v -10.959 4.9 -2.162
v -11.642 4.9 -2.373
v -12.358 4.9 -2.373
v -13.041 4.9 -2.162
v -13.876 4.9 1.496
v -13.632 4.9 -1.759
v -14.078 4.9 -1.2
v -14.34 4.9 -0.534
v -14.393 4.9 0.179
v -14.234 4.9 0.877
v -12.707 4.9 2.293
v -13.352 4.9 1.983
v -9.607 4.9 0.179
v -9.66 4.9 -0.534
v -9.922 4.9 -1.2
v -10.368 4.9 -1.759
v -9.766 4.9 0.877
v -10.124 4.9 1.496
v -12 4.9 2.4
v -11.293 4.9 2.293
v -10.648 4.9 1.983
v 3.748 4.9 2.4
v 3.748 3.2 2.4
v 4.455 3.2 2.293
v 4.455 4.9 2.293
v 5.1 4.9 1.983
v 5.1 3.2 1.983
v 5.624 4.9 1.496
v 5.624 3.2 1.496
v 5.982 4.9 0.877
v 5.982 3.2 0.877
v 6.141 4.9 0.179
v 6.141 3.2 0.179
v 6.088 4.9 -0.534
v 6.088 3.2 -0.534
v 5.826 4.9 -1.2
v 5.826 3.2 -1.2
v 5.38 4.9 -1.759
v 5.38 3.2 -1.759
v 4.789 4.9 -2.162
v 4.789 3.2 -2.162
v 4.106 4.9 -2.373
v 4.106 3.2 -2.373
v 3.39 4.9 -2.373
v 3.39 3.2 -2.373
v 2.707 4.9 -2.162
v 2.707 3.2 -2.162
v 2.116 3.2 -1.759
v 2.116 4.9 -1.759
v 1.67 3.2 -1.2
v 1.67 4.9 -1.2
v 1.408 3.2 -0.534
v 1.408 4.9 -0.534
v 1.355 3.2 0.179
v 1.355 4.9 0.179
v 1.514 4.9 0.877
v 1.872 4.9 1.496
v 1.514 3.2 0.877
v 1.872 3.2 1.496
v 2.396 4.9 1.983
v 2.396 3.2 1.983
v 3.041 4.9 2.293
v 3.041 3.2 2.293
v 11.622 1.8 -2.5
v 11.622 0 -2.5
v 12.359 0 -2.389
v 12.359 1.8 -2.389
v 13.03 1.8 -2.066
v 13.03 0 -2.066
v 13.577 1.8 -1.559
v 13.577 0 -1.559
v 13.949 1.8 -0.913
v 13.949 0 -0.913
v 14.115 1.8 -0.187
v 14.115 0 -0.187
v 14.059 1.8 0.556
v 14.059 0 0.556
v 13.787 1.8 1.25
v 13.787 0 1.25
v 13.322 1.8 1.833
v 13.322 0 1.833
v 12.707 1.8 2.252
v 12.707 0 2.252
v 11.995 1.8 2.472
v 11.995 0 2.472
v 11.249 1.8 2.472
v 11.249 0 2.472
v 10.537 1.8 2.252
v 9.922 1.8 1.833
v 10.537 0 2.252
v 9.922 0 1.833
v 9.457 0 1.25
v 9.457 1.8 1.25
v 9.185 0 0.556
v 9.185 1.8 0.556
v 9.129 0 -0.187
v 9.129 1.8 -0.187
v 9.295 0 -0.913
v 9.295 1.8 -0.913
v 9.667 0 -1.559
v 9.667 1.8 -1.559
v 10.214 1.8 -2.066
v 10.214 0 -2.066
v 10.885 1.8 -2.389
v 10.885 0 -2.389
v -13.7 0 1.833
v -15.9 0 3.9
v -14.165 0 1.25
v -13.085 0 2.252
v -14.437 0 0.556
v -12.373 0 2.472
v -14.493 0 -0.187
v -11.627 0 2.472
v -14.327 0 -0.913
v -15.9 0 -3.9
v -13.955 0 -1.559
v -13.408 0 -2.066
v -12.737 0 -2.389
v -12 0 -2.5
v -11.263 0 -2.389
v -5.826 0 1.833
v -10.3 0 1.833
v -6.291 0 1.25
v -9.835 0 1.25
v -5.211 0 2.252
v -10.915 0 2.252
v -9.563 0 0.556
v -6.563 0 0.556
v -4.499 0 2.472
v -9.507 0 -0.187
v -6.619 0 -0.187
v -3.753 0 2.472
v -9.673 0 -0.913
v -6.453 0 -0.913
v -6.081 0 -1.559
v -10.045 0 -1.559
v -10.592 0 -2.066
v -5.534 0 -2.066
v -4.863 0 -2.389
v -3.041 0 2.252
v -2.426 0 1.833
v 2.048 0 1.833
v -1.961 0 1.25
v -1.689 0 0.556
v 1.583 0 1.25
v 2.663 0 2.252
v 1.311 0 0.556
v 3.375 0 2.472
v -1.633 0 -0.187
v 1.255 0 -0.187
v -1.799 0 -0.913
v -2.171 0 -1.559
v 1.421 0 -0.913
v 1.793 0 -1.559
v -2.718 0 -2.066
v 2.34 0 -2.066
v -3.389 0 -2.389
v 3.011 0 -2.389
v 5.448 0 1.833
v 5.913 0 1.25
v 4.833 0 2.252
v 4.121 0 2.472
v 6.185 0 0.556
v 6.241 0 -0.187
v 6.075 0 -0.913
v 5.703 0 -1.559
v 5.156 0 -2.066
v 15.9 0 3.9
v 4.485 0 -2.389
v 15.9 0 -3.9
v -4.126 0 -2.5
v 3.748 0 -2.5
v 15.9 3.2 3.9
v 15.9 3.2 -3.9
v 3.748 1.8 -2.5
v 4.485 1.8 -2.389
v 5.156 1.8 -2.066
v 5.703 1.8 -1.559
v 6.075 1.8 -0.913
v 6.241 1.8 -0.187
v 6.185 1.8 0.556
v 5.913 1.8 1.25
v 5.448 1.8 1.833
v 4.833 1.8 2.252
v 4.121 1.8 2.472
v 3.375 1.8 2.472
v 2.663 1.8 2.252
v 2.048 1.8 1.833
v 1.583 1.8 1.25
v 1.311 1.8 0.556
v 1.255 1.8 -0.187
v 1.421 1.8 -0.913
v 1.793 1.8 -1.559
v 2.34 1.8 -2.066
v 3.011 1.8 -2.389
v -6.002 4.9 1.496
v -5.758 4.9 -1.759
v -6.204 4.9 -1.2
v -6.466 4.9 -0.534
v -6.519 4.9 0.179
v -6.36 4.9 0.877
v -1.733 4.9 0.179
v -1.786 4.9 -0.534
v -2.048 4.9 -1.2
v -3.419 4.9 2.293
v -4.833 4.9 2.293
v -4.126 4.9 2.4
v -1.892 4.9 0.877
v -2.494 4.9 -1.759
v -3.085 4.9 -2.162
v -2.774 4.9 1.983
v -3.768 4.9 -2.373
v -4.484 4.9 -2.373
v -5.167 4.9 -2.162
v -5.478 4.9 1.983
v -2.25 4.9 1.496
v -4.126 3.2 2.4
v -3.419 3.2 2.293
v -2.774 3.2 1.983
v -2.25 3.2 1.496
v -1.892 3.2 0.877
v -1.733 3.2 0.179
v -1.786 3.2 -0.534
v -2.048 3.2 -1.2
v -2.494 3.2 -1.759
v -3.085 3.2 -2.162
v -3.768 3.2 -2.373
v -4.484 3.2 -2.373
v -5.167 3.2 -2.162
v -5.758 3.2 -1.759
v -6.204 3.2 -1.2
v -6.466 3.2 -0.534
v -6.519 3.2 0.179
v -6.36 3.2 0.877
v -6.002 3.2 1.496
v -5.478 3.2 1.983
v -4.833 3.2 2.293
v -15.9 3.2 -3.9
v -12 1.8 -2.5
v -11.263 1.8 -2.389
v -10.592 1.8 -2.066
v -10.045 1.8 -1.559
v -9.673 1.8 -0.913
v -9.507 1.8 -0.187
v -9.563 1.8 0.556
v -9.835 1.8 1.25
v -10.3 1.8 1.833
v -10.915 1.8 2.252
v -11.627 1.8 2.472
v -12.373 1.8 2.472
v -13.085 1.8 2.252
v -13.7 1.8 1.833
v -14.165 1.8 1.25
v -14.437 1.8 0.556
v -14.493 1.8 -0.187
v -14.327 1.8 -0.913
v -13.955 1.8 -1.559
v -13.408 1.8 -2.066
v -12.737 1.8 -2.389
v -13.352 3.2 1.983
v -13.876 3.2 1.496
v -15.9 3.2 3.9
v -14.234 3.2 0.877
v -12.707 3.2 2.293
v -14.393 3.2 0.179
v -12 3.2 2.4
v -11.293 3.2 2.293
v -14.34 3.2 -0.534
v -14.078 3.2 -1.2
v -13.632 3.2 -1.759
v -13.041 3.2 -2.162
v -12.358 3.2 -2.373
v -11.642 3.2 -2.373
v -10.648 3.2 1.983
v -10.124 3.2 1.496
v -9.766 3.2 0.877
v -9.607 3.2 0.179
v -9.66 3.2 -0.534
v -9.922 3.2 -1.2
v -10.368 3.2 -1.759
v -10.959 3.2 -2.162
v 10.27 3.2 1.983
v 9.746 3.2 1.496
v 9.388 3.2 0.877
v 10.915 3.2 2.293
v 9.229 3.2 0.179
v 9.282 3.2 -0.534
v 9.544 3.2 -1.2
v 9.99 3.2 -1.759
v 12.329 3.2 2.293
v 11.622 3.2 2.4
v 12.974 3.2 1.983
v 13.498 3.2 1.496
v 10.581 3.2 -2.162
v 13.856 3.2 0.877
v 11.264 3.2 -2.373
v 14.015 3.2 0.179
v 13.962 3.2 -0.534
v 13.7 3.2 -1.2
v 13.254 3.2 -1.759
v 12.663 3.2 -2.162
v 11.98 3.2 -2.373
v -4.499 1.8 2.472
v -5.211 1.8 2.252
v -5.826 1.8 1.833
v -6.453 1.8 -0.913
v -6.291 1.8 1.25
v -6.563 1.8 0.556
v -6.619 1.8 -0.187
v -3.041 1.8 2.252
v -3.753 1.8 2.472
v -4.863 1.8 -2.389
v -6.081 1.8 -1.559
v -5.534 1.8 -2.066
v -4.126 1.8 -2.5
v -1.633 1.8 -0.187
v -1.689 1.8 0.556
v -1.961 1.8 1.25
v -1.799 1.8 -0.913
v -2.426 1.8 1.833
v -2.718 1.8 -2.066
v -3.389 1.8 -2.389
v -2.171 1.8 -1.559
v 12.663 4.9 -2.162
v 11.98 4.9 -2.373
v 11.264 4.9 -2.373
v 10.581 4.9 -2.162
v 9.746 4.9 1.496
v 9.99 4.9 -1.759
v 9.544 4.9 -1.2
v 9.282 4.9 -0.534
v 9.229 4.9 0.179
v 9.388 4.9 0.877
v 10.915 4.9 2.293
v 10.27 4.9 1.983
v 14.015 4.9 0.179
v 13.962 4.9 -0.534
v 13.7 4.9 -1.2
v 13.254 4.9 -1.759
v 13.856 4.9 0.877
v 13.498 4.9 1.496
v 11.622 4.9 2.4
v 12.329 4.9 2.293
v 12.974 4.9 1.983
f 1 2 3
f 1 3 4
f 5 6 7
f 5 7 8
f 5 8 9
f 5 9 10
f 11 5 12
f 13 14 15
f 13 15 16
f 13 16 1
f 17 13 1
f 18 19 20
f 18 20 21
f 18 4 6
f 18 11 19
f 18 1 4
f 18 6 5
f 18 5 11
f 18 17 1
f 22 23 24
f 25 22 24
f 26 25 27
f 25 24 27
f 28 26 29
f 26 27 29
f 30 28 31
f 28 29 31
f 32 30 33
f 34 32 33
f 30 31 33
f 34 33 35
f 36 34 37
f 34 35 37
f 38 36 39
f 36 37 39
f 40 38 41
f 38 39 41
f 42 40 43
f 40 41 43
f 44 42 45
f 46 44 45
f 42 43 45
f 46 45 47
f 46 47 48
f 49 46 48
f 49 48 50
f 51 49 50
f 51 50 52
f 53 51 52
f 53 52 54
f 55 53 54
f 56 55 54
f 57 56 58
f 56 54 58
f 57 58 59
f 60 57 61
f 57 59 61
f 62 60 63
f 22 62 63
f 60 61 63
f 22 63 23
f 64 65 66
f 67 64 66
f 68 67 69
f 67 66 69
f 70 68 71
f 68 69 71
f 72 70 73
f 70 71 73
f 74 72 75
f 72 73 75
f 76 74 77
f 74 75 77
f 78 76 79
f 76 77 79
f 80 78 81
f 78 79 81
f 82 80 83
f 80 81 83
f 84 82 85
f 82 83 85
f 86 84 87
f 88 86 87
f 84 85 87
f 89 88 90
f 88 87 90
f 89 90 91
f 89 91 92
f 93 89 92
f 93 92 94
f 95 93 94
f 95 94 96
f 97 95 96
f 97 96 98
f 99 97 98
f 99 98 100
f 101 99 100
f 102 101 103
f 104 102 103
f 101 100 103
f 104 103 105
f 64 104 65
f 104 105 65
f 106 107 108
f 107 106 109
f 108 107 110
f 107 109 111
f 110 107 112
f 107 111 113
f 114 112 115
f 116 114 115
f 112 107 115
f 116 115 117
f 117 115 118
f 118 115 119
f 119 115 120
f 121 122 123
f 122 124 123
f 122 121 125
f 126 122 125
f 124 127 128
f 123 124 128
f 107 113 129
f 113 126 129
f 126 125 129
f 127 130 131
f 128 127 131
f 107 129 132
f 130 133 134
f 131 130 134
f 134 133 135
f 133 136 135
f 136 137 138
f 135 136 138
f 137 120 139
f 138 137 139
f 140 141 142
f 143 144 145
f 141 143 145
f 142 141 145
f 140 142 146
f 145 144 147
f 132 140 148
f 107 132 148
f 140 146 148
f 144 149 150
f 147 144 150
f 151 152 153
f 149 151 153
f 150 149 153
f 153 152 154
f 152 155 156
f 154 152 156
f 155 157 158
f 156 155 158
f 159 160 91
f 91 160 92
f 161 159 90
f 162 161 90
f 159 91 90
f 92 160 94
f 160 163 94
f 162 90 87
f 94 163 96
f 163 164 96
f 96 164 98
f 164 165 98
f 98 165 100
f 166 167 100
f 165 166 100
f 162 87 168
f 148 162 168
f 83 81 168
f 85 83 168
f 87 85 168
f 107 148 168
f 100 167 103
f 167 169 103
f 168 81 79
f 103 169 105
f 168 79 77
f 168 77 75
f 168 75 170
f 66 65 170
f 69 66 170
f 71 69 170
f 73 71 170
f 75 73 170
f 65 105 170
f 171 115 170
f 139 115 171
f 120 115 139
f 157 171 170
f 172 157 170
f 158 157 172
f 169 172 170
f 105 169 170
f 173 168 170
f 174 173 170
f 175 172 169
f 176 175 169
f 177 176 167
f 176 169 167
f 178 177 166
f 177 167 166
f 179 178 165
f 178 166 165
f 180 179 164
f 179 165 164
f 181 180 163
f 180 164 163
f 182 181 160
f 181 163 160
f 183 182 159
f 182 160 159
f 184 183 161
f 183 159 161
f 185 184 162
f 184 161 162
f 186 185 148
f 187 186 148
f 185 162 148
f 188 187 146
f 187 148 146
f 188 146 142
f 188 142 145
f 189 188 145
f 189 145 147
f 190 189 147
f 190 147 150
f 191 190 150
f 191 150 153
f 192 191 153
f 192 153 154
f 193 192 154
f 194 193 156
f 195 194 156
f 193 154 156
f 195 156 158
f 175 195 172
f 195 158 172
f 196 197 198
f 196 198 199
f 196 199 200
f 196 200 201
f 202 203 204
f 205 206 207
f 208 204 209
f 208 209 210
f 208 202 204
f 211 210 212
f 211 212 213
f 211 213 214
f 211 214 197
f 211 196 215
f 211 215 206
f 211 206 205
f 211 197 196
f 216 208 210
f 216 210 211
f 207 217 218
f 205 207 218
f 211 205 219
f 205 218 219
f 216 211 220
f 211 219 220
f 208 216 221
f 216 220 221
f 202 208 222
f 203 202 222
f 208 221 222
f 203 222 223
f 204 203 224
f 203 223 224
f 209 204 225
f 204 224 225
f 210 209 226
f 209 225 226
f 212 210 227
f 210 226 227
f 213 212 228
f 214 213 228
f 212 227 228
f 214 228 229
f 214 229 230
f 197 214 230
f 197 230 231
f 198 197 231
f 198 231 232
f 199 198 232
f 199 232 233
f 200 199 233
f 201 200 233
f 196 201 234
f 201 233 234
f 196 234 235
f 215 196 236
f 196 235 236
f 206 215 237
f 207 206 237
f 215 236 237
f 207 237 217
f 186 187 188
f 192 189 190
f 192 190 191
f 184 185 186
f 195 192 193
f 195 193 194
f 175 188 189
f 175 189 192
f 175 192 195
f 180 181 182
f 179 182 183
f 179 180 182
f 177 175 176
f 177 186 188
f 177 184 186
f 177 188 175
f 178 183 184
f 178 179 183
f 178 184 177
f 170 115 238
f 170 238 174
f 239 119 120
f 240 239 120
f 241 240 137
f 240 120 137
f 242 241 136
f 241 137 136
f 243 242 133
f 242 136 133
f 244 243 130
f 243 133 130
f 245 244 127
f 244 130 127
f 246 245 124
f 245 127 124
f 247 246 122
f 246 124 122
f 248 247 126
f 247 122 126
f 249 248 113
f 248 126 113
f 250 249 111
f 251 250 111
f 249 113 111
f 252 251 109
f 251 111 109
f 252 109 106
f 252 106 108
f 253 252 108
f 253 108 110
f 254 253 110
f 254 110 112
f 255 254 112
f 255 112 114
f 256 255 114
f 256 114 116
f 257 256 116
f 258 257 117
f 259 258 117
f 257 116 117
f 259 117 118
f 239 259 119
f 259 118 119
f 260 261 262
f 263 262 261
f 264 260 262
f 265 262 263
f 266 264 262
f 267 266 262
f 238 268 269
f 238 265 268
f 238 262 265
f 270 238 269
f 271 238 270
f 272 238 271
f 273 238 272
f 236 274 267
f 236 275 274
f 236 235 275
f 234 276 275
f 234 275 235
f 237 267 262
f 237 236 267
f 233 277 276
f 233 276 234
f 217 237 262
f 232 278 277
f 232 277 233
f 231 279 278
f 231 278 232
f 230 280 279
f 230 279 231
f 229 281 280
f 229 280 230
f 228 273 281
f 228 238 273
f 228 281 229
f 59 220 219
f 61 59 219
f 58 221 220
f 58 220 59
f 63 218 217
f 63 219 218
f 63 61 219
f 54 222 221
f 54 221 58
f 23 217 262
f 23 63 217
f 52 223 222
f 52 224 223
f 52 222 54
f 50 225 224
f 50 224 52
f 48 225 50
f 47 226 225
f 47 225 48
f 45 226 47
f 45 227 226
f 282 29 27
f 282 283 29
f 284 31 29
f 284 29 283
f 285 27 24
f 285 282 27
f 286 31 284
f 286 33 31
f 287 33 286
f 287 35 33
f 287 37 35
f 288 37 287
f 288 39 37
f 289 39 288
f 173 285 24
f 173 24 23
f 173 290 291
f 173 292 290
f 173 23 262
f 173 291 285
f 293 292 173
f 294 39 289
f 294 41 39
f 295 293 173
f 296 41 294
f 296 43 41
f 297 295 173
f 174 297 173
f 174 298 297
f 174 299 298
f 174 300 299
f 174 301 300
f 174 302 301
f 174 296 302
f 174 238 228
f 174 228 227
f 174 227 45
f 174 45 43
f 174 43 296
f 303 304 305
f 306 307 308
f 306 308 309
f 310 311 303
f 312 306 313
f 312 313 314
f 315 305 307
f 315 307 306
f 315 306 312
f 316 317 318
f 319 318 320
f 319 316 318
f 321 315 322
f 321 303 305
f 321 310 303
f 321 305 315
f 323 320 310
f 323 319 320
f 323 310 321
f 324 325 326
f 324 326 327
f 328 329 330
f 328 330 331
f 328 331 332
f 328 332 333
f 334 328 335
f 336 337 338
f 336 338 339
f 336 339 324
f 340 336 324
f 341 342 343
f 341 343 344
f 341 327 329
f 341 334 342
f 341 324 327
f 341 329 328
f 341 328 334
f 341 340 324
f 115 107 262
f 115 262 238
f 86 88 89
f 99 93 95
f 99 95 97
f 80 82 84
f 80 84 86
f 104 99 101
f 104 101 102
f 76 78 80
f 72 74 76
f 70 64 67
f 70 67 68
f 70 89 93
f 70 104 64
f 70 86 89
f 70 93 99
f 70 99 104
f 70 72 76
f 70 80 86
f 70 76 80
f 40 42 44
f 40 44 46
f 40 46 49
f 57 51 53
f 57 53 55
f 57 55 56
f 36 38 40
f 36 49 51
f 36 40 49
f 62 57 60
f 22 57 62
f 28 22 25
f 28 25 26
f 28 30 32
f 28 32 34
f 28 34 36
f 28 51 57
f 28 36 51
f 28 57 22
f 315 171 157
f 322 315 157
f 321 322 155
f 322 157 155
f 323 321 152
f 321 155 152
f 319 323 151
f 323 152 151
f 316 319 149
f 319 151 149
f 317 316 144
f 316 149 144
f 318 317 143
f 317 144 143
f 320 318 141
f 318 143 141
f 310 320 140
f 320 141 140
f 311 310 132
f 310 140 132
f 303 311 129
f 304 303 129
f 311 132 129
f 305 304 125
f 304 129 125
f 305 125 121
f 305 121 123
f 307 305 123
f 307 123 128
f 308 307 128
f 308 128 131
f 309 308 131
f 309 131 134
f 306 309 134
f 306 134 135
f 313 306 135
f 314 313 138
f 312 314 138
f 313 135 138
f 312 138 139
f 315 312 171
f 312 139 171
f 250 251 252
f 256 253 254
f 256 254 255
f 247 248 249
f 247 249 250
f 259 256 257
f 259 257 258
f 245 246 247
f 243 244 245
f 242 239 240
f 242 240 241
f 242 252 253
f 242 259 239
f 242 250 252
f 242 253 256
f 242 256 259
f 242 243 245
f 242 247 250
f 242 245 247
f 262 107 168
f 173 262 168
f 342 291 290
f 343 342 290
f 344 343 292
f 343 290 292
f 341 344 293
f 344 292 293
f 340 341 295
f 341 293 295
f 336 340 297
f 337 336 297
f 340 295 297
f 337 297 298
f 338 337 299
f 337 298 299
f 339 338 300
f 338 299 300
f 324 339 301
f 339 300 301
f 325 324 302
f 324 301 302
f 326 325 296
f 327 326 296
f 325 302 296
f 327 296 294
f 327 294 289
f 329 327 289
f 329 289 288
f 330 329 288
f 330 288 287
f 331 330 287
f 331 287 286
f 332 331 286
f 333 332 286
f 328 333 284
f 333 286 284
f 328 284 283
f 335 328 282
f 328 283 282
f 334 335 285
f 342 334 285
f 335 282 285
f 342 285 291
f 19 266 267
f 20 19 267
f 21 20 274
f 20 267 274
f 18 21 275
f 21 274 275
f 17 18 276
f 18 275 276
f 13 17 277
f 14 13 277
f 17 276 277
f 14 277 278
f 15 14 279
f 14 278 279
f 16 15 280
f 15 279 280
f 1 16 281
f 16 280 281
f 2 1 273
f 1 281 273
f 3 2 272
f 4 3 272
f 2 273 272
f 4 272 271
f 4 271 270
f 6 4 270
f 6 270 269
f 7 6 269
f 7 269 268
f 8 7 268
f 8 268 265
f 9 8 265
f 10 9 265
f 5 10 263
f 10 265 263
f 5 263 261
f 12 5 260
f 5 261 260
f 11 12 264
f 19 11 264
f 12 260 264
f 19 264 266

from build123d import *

# Parameters (mm, degrees)
SKETCH_1_W          = 31.8
SKETCH_1_H          = 7.8
EXTRUDE_1_DEPTH     = 3.2
SKETCH_2_R          = 2.4
EXTRUDE_2_DEPTH     = 1.7
SKETCH_3_R          = 2.5
CUT_EXTRUDE_1_DEPTH = 1.8


with BuildPart() as part:
    # Эскиз1 → Бобышка-Вытянуть1 (new body)
    with BuildSketch(Plane(origin=(0, 0, 0), x_dir=(1, 0, 0), z_dir=(0, 1, 0))):
        Rectangle(SKETCH_1_W, SKETCH_1_H)
    extrude(amount=EXTRUDE_1_DEPTH)

    # Эскиз2 → Бобышка-Вытянуть2 (add)
    with BuildSketch(Plane(origin=(0, 3.2, 0), x_dir=(1, 0, 0), z_dir=(0, 1, 0))):
        with Locations(Location((-12, 0, 0), (0, 0, 270))):
            Circle(SKETCH_2_R)
        with Locations(Location((-4.126, 0, 0), (0, 0, 270))):
            Circle(SKETCH_2_R)
        with Locations(Location((3.748, 0, 0), (0, 0, 270))):
            Circle(SKETCH_2_R)
        with Locations(Location((11.622, 0, 0), (0, 0, 270))):
            Circle(SKETCH_2_R)
    extrude(amount=EXTRUDE_2_DEPTH)

    # Эскиз3 → Вырез-Вытянуть1 (cut)
    with BuildSketch(Plane.XZ):
        with Locations(Location((-12, 0, 0), (0, 0, 270))):
            Circle(SKETCH_3_R)
        with Locations(Location((-4.126, 0, 0), (0, 0, 270))):
            Circle(SKETCH_3_R)
        with Locations(Location((3.748, 0, 0), (0, 0, 270))):
            Circle(SKETCH_3_R)
        with Locations(Location((11.622, 0, 0), (0, 0, 270))):
            Circle(SKETCH_3_R)
    extrude(amount=-CUT_EXTRUDE_1_DEPTH, mode=Mode.SUBTRACT)


solid = part.part
